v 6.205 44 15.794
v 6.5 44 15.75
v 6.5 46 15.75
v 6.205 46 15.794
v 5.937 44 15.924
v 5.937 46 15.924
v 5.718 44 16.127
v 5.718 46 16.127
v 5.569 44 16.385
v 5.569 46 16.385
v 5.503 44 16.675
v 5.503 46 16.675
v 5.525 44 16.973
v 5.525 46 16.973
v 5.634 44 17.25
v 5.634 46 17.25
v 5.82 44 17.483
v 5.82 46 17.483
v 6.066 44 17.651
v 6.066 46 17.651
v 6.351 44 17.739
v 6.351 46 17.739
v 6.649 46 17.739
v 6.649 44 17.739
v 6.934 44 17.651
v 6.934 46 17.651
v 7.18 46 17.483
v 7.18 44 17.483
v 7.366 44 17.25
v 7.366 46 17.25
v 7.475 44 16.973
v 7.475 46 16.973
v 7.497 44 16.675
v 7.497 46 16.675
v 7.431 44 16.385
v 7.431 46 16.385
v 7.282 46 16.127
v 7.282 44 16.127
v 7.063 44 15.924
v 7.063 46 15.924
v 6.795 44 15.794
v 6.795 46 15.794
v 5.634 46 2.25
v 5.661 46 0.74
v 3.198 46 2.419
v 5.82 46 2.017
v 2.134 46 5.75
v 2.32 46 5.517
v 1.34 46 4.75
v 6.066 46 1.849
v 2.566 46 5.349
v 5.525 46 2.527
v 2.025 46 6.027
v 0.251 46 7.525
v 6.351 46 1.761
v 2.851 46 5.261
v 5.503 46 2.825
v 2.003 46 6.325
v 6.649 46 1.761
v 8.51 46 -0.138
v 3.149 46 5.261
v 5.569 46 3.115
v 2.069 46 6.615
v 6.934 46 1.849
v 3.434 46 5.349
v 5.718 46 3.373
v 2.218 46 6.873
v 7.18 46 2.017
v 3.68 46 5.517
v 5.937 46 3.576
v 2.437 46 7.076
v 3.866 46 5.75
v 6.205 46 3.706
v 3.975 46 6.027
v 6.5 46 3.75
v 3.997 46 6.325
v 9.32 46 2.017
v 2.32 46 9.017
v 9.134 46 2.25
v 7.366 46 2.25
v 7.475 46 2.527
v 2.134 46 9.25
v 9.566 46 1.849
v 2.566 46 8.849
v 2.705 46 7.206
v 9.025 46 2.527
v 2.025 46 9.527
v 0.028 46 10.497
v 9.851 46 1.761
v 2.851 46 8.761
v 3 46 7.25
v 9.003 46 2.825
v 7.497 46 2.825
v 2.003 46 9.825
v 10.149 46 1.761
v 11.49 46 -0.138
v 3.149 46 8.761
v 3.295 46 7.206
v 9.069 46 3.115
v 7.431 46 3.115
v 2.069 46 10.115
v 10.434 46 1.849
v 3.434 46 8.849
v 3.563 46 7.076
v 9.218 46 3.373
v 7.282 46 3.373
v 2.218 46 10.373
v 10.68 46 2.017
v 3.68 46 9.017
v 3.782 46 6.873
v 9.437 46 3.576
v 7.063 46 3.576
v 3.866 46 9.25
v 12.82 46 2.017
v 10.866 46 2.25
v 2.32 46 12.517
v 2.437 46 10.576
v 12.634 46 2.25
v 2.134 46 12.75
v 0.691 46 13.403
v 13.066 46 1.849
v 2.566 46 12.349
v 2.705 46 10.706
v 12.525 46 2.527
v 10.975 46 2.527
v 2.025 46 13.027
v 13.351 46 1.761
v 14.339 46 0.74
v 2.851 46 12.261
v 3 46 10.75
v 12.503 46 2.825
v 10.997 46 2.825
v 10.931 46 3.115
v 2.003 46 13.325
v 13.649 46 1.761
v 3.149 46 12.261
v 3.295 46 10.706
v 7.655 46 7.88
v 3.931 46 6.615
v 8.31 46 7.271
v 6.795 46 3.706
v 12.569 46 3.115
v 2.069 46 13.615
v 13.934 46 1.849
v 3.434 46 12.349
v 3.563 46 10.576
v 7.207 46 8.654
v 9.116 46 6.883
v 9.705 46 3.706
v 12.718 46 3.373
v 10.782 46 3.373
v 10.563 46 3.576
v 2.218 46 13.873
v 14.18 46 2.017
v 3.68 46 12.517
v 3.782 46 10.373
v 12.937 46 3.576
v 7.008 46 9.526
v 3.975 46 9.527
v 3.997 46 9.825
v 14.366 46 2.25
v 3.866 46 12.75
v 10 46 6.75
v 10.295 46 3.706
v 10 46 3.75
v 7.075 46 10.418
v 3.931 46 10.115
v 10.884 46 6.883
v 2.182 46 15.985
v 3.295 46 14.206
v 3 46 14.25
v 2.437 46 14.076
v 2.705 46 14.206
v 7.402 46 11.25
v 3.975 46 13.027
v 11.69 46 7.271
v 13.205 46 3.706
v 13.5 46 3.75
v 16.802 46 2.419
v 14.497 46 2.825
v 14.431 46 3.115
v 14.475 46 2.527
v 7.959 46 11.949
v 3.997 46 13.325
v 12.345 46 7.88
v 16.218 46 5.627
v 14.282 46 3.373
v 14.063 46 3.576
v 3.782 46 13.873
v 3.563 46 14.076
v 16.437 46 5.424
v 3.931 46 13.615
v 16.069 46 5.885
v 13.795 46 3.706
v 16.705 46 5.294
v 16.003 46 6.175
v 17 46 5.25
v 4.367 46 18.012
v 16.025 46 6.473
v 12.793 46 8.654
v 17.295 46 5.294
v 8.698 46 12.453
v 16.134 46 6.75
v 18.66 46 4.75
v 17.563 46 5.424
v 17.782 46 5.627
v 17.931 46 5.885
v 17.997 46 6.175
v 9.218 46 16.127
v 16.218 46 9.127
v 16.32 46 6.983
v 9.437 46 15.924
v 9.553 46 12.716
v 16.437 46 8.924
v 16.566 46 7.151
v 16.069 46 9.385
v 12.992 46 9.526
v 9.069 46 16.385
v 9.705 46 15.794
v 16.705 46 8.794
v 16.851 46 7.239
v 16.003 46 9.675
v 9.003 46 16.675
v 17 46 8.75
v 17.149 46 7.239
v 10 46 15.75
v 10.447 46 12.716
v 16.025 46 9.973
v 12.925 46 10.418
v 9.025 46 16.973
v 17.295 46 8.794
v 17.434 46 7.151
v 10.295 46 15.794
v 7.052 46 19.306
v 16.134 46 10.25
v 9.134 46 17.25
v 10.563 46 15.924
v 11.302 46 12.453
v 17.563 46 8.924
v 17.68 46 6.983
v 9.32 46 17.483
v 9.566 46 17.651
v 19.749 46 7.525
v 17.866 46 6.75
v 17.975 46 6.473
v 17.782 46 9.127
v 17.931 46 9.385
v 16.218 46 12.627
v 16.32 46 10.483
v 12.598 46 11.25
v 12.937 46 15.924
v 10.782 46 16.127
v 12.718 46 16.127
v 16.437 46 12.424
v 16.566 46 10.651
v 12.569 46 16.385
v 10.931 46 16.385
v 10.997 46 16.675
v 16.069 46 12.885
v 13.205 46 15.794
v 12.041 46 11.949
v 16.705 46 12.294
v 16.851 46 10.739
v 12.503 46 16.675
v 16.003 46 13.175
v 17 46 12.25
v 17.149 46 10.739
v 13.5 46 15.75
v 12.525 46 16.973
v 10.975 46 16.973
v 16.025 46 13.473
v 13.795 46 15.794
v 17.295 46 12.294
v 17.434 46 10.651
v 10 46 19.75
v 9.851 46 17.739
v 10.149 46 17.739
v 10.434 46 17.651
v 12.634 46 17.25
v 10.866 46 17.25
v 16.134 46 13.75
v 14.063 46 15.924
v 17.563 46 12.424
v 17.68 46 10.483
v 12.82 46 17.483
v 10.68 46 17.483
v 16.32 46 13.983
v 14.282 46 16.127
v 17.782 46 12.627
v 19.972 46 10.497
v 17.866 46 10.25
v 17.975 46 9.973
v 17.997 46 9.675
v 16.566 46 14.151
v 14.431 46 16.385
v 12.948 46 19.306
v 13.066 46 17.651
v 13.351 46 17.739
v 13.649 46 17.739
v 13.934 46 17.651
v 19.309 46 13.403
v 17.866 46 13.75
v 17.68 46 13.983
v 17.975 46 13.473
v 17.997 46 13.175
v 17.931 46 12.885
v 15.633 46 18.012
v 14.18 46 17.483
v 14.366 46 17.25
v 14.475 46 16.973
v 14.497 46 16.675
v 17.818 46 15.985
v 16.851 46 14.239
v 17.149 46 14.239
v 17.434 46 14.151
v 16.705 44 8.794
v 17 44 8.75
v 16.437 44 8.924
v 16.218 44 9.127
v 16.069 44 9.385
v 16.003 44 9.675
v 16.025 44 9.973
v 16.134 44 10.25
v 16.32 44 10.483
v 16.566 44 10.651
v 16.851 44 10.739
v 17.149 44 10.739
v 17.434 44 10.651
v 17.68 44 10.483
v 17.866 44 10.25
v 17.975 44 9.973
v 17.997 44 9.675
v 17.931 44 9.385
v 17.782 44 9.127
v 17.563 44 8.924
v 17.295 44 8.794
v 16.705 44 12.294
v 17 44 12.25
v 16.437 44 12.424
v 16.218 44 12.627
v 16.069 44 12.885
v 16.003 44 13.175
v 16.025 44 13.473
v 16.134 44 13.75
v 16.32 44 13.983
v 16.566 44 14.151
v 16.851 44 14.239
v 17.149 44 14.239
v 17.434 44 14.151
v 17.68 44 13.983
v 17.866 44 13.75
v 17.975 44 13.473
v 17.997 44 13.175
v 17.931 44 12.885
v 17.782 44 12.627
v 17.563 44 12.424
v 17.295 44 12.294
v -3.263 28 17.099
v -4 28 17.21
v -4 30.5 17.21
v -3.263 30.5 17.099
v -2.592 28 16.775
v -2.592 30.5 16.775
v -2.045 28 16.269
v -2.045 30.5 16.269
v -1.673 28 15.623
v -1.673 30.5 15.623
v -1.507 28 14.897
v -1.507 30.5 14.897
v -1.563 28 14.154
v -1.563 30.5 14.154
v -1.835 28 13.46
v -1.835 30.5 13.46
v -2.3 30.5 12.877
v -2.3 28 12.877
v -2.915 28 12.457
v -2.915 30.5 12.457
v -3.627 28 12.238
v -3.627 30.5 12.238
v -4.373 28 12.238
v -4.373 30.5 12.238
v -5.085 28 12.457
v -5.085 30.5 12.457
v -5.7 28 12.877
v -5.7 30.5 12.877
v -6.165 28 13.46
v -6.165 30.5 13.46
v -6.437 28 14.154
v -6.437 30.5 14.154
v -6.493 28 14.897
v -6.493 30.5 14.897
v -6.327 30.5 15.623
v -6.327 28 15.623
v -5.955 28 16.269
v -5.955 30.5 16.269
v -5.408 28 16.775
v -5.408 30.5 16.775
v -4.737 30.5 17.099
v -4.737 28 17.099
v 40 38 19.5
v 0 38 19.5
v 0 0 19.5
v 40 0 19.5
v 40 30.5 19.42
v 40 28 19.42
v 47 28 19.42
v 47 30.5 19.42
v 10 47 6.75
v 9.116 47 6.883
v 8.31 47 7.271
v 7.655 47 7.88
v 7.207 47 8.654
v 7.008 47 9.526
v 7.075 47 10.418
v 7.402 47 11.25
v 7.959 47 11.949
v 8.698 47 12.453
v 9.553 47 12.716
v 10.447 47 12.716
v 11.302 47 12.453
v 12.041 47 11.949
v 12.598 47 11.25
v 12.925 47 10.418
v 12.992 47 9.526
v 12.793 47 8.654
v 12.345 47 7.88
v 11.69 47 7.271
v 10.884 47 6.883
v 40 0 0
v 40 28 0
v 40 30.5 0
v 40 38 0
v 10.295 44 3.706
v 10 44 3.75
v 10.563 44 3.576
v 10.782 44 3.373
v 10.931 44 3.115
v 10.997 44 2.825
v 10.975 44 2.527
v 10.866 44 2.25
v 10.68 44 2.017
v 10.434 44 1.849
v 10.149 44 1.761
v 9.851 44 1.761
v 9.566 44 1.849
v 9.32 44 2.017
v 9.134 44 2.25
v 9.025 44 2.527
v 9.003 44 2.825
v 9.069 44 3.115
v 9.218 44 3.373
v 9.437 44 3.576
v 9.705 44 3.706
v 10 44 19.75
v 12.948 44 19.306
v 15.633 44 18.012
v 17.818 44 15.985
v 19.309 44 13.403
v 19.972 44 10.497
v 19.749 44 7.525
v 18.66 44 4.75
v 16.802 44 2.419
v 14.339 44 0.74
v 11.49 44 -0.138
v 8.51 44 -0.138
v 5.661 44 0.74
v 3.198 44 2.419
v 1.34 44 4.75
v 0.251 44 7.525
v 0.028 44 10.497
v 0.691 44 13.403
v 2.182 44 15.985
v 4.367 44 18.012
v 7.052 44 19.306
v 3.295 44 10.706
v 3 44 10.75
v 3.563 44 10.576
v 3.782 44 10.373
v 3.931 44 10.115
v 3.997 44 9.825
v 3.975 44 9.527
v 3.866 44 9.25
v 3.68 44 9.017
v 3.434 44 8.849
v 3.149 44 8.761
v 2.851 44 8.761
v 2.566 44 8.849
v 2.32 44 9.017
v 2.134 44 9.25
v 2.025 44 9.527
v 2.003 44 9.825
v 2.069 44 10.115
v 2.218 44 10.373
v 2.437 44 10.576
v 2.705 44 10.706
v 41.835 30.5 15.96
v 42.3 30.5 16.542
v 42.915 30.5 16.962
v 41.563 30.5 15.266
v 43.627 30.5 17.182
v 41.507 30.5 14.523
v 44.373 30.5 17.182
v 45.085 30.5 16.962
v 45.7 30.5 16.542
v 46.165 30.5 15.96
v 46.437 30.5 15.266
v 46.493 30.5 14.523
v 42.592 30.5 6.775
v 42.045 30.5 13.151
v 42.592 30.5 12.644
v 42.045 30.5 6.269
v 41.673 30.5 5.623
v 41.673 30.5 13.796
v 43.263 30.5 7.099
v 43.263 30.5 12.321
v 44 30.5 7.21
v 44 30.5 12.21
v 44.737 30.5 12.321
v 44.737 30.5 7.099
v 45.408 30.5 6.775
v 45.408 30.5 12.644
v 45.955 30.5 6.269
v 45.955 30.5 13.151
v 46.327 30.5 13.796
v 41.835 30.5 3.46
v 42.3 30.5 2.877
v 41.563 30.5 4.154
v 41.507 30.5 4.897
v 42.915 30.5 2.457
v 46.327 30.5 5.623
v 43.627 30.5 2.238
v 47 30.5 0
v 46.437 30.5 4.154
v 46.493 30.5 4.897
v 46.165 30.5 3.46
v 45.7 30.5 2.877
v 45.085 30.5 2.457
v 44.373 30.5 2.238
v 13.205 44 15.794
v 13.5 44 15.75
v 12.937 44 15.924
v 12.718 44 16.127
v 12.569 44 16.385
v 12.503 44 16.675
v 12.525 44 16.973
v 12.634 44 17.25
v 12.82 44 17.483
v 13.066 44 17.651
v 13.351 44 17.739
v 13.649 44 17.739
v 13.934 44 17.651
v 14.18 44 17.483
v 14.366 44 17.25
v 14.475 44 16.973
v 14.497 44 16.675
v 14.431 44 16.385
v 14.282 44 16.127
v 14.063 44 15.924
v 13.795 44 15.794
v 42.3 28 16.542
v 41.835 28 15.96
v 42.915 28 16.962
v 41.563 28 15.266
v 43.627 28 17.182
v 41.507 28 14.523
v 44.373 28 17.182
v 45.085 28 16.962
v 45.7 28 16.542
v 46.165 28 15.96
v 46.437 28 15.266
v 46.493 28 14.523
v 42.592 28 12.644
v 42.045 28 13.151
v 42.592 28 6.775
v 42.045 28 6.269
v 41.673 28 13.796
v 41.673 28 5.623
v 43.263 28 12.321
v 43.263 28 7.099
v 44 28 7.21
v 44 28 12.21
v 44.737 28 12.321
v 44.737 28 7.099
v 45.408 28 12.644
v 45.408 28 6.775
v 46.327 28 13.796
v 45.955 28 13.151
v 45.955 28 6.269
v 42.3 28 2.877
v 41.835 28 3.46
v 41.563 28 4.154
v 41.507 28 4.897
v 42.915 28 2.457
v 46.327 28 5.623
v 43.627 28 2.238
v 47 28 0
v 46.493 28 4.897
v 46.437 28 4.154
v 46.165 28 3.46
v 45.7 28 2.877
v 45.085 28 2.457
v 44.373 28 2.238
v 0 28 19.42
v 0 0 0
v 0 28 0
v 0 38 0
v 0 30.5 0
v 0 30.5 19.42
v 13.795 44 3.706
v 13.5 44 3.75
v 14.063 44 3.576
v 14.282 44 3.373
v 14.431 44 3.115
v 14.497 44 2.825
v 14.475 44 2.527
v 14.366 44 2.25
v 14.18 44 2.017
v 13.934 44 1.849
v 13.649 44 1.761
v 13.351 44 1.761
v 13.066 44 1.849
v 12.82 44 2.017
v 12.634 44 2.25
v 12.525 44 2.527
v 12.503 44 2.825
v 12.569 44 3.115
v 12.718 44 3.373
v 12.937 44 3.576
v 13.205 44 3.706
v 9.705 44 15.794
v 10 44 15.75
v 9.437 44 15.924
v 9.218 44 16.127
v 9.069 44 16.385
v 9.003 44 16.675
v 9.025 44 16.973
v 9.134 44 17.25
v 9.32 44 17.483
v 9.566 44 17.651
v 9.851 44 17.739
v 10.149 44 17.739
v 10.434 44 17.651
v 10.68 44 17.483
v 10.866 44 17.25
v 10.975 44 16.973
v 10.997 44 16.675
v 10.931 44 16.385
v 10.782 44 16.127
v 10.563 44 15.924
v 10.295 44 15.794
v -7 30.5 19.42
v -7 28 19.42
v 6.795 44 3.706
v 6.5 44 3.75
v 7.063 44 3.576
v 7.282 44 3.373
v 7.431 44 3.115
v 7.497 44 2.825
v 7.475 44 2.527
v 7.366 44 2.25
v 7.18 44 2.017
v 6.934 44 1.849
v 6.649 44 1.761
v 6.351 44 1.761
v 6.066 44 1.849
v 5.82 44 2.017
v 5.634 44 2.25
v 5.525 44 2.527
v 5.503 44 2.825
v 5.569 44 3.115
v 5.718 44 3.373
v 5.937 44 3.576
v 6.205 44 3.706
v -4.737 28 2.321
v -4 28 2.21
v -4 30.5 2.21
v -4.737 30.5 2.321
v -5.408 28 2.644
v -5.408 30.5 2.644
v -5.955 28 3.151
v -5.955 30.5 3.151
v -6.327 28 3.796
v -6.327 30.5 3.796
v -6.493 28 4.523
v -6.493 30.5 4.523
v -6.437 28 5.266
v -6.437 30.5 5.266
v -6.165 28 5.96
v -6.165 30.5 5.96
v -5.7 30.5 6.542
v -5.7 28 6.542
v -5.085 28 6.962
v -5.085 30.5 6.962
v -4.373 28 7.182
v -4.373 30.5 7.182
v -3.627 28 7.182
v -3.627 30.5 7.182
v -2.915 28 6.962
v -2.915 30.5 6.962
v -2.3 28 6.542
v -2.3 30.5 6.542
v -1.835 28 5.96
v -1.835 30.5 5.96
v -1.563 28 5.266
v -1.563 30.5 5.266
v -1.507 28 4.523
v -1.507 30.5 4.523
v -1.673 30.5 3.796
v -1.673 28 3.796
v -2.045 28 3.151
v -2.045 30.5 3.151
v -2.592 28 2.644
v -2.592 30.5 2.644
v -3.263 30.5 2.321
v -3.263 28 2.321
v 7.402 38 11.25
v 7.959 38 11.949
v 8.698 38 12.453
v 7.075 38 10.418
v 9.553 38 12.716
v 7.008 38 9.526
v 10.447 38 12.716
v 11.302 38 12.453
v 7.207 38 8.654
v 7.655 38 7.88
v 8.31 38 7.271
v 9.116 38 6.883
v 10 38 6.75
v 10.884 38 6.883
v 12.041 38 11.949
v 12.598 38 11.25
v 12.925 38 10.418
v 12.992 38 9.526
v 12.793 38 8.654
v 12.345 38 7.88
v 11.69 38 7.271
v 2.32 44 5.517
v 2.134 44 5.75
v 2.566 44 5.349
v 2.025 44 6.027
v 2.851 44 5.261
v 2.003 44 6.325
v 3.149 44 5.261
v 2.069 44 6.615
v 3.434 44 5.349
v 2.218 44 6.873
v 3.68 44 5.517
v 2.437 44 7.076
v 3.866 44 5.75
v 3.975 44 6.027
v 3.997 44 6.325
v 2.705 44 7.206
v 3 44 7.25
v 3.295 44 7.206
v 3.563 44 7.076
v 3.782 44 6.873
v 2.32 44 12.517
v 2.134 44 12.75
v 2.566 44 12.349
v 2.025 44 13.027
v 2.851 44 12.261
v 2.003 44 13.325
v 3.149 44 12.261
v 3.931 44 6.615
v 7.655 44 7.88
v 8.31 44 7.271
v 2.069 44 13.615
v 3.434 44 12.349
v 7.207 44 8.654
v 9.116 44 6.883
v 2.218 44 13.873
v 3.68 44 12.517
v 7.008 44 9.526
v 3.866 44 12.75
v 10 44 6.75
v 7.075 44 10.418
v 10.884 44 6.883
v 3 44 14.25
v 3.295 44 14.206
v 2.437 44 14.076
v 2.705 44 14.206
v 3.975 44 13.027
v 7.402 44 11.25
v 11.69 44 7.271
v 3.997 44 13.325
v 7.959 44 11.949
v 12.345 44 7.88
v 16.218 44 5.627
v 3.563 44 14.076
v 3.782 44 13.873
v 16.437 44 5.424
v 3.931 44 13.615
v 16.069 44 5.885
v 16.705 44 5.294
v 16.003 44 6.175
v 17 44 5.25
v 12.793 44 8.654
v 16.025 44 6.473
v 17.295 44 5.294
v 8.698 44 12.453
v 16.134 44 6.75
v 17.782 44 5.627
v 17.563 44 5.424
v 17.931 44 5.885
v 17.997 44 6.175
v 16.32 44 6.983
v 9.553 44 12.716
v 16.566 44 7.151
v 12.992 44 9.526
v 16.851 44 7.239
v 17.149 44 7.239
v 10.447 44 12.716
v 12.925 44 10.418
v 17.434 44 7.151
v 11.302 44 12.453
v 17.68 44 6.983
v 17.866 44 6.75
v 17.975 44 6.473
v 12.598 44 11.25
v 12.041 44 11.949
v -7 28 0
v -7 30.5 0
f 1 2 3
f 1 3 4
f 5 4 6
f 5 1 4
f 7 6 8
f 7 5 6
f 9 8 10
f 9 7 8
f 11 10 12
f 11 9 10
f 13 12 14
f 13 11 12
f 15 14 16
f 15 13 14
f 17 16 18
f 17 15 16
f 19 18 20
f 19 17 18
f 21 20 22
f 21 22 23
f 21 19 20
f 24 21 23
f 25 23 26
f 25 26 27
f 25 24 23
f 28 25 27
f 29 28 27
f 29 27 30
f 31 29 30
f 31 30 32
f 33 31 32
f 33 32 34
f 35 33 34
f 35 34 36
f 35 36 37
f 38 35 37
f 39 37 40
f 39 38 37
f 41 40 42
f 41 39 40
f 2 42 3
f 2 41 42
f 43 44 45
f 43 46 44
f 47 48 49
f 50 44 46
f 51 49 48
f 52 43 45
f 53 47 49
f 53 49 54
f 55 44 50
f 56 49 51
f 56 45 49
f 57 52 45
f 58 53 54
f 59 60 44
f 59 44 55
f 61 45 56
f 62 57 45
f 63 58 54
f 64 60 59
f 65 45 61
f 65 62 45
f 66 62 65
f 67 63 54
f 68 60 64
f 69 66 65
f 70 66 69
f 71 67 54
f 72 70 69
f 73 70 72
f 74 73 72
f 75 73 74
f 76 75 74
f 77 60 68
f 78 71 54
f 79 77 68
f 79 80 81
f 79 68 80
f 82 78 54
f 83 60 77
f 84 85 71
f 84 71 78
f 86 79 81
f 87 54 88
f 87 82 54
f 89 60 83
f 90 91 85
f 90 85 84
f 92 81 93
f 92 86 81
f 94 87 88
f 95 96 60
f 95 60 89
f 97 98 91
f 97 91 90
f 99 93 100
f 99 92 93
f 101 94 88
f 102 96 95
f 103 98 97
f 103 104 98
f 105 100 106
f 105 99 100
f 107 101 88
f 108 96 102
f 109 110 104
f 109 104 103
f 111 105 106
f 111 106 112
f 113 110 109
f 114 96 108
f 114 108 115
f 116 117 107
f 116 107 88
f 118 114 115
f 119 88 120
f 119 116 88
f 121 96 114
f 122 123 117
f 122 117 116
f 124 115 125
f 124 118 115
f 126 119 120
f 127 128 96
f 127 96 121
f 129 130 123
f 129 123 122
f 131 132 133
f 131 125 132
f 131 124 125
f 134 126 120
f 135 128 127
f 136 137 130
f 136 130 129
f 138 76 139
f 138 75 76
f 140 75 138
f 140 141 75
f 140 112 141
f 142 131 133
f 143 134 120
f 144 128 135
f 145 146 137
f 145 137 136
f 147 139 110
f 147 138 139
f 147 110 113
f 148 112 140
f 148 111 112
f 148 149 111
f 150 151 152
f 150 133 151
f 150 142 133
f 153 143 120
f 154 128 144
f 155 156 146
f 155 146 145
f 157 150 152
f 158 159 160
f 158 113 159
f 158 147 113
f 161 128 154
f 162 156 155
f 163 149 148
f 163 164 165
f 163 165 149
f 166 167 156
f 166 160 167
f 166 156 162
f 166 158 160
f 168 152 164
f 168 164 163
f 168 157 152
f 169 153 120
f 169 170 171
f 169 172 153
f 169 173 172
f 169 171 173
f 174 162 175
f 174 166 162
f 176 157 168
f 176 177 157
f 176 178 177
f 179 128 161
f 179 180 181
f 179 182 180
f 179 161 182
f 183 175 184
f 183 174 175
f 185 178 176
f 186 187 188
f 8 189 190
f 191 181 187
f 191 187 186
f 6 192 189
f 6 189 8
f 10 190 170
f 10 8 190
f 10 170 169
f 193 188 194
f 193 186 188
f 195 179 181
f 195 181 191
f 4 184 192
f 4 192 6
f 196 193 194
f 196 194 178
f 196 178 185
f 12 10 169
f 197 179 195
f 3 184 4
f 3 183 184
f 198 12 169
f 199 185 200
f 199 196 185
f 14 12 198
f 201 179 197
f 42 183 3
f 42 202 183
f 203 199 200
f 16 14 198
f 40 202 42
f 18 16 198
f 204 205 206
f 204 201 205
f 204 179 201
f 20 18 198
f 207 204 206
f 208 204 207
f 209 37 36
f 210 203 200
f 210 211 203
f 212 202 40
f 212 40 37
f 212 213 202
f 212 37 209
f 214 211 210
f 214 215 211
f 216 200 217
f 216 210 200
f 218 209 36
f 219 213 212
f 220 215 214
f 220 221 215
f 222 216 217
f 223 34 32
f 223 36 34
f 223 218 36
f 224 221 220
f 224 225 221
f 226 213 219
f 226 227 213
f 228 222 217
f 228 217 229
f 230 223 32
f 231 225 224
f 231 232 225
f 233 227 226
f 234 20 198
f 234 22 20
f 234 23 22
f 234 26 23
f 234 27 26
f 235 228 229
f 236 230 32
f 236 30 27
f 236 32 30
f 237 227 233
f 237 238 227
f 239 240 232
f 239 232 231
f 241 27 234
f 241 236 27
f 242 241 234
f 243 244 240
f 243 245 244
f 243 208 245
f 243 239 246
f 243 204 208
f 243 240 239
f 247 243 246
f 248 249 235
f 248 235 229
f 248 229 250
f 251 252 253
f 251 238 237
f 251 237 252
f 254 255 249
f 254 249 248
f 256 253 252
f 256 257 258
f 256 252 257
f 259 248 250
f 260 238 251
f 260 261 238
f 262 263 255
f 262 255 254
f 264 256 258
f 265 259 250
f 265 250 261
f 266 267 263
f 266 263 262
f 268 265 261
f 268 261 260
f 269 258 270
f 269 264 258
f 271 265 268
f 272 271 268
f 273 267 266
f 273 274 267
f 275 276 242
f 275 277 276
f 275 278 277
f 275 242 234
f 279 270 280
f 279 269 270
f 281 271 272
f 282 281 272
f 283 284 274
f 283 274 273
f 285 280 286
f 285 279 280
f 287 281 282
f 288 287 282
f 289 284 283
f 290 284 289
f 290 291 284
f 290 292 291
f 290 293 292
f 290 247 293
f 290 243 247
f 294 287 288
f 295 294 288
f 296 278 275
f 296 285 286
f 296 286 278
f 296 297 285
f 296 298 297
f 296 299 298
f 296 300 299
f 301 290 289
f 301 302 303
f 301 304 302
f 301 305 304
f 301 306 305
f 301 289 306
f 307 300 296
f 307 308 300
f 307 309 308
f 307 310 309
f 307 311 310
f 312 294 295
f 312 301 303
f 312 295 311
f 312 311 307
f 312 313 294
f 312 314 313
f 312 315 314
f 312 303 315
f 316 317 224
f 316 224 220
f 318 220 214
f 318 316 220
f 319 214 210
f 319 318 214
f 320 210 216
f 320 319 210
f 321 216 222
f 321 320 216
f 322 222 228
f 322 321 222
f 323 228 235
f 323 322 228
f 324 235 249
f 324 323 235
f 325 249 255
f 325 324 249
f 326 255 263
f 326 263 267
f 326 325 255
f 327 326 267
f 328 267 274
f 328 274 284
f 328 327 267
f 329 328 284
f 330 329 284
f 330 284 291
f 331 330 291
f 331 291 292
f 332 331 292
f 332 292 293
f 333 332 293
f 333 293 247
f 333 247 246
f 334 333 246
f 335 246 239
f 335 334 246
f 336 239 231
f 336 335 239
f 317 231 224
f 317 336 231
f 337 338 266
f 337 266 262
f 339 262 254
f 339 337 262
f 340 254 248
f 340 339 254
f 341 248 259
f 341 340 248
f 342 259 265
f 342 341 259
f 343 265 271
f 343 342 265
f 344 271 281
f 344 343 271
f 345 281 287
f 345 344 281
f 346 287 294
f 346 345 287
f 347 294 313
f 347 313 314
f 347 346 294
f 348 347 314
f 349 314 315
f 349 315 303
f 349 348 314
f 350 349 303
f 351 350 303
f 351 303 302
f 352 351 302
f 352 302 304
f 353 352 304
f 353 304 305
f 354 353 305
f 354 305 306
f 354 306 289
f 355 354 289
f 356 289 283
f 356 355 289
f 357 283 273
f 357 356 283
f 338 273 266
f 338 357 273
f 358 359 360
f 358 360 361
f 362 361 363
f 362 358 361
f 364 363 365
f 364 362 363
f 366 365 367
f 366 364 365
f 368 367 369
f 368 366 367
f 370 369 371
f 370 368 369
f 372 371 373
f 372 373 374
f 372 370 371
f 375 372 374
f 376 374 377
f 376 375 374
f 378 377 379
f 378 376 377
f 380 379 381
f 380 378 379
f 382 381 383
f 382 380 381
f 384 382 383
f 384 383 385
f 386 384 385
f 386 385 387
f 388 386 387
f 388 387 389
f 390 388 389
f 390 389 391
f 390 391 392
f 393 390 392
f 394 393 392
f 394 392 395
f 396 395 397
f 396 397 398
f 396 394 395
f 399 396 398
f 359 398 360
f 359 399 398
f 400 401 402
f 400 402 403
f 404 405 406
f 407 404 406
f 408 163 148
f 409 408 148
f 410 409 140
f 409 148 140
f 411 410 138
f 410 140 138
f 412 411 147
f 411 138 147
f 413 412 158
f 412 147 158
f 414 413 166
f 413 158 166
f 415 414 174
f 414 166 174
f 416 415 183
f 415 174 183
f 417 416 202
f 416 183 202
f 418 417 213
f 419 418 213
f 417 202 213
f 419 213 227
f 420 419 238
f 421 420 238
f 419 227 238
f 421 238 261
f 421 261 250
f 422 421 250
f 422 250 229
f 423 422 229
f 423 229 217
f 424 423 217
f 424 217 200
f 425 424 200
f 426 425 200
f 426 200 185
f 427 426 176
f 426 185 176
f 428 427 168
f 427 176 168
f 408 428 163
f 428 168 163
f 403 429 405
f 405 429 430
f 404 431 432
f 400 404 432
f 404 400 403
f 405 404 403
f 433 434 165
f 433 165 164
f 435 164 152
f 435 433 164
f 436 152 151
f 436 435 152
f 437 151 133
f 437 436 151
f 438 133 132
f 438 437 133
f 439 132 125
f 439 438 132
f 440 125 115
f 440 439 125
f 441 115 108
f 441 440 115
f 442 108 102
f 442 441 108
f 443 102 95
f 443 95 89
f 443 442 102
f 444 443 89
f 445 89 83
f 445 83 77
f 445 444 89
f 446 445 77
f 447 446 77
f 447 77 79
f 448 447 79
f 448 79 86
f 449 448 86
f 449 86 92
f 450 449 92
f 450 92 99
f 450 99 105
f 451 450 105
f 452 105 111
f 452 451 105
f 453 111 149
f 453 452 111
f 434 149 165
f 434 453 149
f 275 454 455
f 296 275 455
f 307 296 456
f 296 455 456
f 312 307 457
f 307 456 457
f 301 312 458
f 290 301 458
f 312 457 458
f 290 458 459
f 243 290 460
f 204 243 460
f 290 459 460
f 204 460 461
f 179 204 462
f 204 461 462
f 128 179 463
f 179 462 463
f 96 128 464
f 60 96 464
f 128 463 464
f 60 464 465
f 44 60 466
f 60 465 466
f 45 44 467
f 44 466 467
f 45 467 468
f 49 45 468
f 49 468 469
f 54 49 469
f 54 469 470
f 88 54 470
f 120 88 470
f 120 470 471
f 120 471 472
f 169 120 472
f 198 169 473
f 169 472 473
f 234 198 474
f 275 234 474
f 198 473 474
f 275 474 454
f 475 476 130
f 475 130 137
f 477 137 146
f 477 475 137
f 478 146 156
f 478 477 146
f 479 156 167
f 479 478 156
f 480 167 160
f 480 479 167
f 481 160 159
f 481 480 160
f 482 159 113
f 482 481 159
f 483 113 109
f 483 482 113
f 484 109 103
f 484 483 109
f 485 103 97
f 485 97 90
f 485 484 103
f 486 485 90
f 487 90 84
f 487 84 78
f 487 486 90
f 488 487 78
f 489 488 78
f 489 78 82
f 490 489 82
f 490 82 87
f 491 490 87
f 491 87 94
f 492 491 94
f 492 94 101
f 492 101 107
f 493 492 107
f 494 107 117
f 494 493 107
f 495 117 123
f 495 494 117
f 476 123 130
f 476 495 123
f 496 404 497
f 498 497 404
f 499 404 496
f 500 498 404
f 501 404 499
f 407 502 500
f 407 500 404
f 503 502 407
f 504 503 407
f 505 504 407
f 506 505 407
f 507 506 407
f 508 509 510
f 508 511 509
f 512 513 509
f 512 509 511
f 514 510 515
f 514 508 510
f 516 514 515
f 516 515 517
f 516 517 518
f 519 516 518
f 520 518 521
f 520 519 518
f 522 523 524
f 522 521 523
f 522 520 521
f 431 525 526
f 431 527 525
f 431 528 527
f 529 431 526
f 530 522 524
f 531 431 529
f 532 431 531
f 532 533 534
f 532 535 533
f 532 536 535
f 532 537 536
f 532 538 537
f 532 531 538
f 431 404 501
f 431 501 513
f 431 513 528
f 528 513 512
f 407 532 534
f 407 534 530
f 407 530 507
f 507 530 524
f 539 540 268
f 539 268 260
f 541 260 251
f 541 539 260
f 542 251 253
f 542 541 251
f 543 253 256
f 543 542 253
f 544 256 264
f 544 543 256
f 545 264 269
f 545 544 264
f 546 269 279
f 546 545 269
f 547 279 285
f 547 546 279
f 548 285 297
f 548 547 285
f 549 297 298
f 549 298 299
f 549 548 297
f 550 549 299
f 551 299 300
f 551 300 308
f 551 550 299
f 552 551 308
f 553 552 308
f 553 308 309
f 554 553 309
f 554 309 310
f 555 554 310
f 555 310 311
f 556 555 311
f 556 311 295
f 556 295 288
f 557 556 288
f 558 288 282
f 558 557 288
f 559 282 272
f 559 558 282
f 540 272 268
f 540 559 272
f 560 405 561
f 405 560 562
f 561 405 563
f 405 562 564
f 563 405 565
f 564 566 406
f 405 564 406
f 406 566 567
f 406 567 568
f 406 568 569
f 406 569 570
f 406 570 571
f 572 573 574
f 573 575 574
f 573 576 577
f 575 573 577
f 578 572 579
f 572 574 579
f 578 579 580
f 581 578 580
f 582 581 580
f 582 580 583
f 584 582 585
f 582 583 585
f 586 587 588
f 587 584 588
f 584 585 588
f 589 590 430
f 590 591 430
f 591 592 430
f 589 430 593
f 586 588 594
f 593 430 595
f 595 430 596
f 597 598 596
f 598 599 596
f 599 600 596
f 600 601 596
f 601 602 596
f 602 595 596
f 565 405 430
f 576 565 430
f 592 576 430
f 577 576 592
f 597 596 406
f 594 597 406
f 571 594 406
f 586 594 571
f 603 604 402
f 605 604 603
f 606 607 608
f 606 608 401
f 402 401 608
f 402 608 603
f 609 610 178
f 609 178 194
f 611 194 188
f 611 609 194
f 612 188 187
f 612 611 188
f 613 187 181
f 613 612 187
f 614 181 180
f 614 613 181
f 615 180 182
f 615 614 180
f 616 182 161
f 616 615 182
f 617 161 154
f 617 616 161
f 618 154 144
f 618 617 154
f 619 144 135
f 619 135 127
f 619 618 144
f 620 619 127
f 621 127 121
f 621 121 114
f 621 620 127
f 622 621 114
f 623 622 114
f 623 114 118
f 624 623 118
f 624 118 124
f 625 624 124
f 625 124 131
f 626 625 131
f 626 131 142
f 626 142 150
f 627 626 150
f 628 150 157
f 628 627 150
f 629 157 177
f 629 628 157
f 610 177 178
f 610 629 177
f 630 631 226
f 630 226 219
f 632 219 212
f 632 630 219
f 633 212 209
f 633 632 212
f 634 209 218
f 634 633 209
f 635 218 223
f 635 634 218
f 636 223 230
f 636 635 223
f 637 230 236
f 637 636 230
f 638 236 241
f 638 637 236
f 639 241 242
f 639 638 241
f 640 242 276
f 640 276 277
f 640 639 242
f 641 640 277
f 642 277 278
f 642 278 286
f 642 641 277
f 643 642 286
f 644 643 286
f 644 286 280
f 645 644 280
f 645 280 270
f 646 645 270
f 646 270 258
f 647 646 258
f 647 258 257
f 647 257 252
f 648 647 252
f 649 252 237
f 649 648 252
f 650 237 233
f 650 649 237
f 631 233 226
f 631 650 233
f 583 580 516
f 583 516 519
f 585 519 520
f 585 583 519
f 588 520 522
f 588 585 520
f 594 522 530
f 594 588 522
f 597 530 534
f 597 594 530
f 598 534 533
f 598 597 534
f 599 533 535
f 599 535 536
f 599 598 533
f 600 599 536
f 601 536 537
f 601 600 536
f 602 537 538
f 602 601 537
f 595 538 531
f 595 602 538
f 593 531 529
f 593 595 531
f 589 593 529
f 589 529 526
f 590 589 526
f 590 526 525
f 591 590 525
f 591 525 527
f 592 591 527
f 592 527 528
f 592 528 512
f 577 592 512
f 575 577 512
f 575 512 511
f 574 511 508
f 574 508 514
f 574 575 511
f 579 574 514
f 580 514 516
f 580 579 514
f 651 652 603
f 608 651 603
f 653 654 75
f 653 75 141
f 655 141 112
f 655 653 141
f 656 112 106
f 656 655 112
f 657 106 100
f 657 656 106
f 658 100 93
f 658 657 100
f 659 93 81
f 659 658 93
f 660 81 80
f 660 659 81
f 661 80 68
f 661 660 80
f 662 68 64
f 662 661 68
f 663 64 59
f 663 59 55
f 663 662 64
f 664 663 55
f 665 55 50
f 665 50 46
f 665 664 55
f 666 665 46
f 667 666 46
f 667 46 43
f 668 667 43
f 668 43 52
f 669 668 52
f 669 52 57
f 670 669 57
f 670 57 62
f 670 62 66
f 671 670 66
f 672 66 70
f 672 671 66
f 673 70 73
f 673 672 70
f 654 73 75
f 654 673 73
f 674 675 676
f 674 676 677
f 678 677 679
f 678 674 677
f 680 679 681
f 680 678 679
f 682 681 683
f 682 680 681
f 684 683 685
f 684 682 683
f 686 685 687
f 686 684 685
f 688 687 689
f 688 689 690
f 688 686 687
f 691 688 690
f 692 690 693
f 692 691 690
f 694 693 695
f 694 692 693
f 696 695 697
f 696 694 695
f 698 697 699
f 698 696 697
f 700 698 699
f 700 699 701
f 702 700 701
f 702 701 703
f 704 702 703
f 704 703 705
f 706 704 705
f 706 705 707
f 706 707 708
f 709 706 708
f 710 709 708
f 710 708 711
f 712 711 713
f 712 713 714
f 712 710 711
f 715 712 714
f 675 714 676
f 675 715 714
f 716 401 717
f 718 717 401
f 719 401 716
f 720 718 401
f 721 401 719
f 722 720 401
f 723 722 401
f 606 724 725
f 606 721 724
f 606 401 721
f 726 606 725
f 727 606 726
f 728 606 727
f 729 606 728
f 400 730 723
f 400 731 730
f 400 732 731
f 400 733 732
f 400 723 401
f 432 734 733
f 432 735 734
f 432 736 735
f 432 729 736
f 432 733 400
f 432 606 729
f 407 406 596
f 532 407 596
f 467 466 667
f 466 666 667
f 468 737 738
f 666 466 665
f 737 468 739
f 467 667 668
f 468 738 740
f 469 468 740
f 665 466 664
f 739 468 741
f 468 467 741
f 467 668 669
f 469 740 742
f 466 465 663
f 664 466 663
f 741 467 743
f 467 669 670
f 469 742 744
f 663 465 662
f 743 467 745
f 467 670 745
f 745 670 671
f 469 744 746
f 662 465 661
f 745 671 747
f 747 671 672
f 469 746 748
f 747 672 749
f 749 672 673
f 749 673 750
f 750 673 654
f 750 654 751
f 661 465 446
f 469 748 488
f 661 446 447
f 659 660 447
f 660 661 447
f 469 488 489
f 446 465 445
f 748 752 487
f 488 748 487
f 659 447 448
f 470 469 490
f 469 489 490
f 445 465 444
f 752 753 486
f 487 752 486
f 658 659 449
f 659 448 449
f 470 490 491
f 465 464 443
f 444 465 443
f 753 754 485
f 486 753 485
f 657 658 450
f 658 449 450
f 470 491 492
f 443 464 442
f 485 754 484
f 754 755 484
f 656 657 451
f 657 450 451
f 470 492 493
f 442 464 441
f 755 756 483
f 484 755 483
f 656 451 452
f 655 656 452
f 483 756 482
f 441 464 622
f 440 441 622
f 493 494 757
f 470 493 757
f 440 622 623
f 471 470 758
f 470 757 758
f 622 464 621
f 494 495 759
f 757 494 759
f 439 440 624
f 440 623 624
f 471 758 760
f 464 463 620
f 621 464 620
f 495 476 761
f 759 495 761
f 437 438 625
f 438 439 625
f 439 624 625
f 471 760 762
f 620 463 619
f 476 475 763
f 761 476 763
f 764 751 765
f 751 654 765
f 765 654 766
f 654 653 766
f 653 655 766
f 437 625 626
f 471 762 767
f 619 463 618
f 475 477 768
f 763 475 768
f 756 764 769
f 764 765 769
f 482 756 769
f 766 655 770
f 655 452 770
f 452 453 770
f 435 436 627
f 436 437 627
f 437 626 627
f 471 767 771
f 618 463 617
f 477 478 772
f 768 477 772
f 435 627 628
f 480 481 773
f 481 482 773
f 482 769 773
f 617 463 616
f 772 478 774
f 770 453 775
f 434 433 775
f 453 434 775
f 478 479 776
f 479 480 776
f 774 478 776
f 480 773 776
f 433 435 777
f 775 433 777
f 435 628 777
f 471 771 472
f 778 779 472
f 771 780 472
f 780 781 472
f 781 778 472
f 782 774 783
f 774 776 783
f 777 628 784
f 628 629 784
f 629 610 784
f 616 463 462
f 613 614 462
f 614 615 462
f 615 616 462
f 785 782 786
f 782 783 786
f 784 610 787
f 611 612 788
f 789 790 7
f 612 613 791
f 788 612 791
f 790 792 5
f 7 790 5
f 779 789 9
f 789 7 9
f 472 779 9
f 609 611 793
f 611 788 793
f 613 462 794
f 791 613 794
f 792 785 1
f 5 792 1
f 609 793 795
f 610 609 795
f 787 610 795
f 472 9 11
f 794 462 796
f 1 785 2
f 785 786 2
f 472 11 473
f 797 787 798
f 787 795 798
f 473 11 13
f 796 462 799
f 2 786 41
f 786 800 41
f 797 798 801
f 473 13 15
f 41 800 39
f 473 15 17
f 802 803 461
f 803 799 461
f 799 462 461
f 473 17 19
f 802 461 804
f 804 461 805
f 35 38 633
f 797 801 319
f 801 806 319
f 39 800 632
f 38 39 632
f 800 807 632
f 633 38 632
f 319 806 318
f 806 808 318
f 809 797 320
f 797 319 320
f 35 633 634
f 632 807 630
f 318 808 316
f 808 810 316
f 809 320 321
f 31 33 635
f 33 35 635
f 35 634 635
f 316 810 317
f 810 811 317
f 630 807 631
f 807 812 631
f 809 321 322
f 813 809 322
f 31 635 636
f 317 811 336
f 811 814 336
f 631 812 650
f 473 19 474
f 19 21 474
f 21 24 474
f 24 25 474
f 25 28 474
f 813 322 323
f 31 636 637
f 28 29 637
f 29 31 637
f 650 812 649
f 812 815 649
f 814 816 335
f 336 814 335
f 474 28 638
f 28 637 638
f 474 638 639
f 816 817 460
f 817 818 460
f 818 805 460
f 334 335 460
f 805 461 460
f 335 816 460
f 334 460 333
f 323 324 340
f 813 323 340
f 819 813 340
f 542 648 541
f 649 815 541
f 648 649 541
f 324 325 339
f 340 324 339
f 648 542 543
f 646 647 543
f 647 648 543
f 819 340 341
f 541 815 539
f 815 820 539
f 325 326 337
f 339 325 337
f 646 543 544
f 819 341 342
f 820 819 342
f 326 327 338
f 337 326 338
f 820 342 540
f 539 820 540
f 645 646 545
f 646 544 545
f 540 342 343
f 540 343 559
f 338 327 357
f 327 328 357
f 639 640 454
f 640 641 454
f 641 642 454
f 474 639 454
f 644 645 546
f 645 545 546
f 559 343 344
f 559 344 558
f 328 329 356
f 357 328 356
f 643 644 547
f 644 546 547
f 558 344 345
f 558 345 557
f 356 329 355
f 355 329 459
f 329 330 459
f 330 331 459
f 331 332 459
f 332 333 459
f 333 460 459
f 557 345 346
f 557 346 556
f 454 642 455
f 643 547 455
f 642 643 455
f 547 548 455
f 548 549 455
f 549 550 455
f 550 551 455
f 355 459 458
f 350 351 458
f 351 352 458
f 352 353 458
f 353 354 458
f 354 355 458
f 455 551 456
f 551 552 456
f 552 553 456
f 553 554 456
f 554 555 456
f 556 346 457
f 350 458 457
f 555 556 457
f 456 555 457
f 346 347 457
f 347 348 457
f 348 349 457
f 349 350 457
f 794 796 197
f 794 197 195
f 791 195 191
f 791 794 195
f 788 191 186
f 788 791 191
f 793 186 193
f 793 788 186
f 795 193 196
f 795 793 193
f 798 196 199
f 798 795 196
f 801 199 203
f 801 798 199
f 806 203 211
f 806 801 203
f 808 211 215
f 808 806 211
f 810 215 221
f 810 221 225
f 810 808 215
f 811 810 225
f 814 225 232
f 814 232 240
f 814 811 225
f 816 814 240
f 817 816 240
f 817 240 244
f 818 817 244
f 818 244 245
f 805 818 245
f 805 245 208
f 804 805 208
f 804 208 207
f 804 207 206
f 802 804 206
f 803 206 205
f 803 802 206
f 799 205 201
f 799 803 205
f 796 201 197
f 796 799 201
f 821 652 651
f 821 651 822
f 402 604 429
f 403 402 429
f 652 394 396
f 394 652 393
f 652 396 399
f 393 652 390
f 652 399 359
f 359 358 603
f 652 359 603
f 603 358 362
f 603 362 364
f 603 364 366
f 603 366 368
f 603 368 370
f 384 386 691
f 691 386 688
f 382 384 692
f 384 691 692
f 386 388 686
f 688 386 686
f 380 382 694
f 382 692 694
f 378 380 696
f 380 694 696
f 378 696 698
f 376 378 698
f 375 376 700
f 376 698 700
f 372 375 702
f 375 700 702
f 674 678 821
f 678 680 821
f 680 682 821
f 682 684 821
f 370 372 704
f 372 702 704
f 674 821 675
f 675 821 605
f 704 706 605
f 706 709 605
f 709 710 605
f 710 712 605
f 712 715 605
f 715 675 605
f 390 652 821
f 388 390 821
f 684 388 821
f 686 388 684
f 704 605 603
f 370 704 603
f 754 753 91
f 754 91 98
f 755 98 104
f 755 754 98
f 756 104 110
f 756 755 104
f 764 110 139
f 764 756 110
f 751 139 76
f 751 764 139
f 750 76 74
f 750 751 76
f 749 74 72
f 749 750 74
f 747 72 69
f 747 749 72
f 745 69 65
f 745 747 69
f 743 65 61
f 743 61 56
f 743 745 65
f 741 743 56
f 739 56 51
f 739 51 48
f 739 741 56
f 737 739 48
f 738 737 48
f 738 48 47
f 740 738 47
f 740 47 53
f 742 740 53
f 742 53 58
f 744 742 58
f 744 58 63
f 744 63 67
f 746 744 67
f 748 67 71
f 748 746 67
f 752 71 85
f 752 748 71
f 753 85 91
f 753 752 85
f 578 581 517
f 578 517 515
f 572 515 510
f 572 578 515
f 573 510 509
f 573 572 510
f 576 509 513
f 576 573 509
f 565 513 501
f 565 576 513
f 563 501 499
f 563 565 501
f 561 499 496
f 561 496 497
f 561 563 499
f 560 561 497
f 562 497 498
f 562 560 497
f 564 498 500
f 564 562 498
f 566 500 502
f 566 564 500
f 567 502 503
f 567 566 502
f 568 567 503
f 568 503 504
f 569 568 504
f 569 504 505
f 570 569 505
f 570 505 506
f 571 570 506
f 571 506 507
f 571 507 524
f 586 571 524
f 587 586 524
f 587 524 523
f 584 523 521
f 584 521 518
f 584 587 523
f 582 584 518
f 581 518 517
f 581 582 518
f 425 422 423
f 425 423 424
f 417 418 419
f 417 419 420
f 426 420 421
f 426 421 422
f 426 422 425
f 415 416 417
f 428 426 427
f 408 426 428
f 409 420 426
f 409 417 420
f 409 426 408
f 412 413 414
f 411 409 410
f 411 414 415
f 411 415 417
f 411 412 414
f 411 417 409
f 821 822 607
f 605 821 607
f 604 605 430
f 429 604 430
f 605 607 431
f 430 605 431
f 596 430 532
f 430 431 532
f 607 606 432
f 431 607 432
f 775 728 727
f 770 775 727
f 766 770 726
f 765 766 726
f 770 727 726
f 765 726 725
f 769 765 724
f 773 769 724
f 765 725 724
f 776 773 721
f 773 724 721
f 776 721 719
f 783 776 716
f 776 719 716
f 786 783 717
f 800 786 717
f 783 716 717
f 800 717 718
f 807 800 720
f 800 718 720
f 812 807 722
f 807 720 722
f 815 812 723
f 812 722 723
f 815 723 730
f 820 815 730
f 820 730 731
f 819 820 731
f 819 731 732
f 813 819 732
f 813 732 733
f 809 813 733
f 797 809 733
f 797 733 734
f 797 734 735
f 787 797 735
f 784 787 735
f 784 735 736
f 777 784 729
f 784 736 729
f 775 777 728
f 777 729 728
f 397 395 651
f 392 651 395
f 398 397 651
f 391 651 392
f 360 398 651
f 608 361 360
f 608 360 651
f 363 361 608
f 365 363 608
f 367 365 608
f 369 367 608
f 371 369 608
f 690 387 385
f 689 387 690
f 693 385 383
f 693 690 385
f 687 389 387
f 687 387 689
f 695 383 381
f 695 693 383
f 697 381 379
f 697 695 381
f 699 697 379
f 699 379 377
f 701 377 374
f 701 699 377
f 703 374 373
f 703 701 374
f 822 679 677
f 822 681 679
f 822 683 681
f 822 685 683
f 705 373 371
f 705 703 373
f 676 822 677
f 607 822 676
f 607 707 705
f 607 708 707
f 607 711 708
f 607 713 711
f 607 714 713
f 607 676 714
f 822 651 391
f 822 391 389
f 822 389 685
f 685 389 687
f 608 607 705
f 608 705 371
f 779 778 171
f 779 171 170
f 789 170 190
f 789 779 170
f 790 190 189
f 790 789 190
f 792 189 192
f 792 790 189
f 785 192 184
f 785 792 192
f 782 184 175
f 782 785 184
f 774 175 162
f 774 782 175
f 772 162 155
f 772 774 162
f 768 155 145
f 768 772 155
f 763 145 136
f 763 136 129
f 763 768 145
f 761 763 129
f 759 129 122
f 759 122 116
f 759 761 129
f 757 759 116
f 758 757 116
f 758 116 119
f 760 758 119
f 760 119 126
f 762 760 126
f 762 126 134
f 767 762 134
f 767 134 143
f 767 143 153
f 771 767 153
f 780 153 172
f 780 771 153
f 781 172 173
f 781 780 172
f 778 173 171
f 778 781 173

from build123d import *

# Parameters (mm, degrees)
SKETCH_1_W      = 40
SKETCH_1_H      = 38
EXTRUDE_1_DEPTH = 19.5
EXTRUDE_START   = -10
SKETCH_2_W      = 7
SKETCH_2_H      = 19.419635957
SKETCH_2_R      = 2.5
EXTRUDE_2_DEPTH = 2.5
SKETCH_3_R      = 3
EXTRUDE_3_DEPTH = 6
SKETCH_4_R      = 10
SKETCH_4_R_2    = 1
EXTRUDE_4_DEPTH = 2
SKETCH_5_R      = 3
EXTRUDE_5_DEPTH = 1


with BuildPart() as part:
    # 草图1 → 凸台-拉伸1 (new body)
    with BuildSketch(Plane.XY):
        with Locations((20, 19)):
            Rectangle(SKETCH_1_W, SKETCH_1_H)
    extrude(amount=EXTRUDE_1_DEPTH)

    # 草图2 → 凸台-拉伸2 (add)
    # profile 1 of 2: a face of its own
    with BuildSketch(Plane(origin=(0, 38, 0), x_dir=(1, 0, 0), z_dir=(0, 1, 0)).offset(EXTRUDE_START)):
        with Locations((43.5, -9.709817979)):
            Rectangle(SKETCH_2_W, SKETCH_2_H)
        with Locations(Location((44, -4.709817978, 0), (0, 0, 270))):
            Circle(SKETCH_2_R, mode=Mode.SUBTRACT)
        with Locations(Location((44, -14.709817978, 0), (0, 0, 90))):
            Circle(SKETCH_2_R, mode=Mode.SUBTRACT)
    # profile 2 of 2: a face of its own
    with BuildSketch(Plane(origin=(0, 38, 0), x_dir=(1, 0, 0), z_dir=(0, 1, 0)).offset(EXTRUDE_START)):
        with Locations((-3.5, -9.709817979)):
            Rectangle(SKETCH_2_W, SKETCH_2_H)
        with Locations(Location((-4, -14.709817978, 0), (0, 0, 270))):
            Circle(SKETCH_2_R, mode=Mode.SUBTRACT)
        with Locations(Location((-4, -4.709817978, 0), (0, 0, 90))):
            Circle(SKETCH_2_R, mode=Mode.SUBTRACT)
    extrude(amount=EXTRUDE_2_DEPTH)

    # 草图3 → 凸台-拉伸3 (add)
    with BuildSketch(Plane(origin=(0, 38, 0), x_dir=(1, 0, 0), z_dir=(0, 1, 0))):
        with Locations(Location((10, -9.75, 0), (0, 0, 90))):
            Circle(SKETCH_3_R)
    extrude(amount=EXTRUDE_3_DEPTH)

    # 草图4 → 凸台-拉伸4 (add)
    with BuildSketch(Plane(origin=(0, 44, 0), x_dir=(1, 0, 0), z_dir=(0, 1, 0))):
        with Locations(Location((10, -9.75, 0), (0, 0, 270))):
            Circle(SKETCH_4_R)
        with Locations(Location((10, -2.75, 0), (0, 0, 270))):
            Circle(SKETCH_4_R_2, mode=Mode.SUBTRACT)
        with Locations(Location((13.5, -2.75, 0), (0, 0, 270))):
            Circle(SKETCH_4_R_2, mode=Mode.SUBTRACT)
        with Locations(Location((6.5, -2.75, 0), (0, 0, 270))):
            Circle(SKETCH_4_R_2, mode=Mode.SUBTRACT)
        with Locations(Location((6.5, -16.75, 0), (0, 0, 90))):
            Circle(SKETCH_4_R_2, mode=Mode.SUBTRACT)
        with Locations(Location((13.5, -16.75, 0), (0, 0, 90))):
            Circle(SKETCH_4_R_2, mode=Mode.SUBTRACT)
        with Locations(Location((10, -16.75, 0), (0, 0, 90))):
            Circle(SKETCH_4_R_2, mode=Mode.SUBTRACT)
        with Locations(Location((3, -13.25, 0), (0, 0, 270))):
            Circle(SKETCH_4_R_2, mode=Mode.SUBTRACT)
        with Locations(Location((3, -9.75, 0), (0, 0, 270))):
            Circle(SKETCH_4_R_2, mode=Mode.SUBTRACT)
        with Locations(Location((3, -6.25, 0), (0, 0, 270))):
            Circle(SKETCH_4_R_2, mode=Mode.SUBTRACT)
        with Locations(Location((17, -6.25, 0), (0, 0, 90))):
            Circle(SKETCH_4_R_2, mode=Mode.SUBTRACT)
        with Locations(Location((17, -9.75, 0), (0, 0, 90))):
            Circle(SKETCH_4_R_2, mode=Mode.SUBTRACT)
        with Locations(Location((17, -13.25, 0), (0, 0, 90))):
            Circle(SKETCH_4_R_2, mode=Mode.SUBTRACT)
    extrude(amount=EXTRUDE_4_DEPTH)

    # 草图5 → 凸台-拉伸5 (add)
    with BuildSketch(Plane(origin=(0, 46, 0), x_dir=(1, 0, 0), z_dir=(0, 1, 0))):
        with Locations(Location((10, -9.75, 0), (0, 0, 90))):
            Circle(SKETCH_5_R)
    extrude(amount=EXTRUDE_5_DEPTH)


solid = part.part
